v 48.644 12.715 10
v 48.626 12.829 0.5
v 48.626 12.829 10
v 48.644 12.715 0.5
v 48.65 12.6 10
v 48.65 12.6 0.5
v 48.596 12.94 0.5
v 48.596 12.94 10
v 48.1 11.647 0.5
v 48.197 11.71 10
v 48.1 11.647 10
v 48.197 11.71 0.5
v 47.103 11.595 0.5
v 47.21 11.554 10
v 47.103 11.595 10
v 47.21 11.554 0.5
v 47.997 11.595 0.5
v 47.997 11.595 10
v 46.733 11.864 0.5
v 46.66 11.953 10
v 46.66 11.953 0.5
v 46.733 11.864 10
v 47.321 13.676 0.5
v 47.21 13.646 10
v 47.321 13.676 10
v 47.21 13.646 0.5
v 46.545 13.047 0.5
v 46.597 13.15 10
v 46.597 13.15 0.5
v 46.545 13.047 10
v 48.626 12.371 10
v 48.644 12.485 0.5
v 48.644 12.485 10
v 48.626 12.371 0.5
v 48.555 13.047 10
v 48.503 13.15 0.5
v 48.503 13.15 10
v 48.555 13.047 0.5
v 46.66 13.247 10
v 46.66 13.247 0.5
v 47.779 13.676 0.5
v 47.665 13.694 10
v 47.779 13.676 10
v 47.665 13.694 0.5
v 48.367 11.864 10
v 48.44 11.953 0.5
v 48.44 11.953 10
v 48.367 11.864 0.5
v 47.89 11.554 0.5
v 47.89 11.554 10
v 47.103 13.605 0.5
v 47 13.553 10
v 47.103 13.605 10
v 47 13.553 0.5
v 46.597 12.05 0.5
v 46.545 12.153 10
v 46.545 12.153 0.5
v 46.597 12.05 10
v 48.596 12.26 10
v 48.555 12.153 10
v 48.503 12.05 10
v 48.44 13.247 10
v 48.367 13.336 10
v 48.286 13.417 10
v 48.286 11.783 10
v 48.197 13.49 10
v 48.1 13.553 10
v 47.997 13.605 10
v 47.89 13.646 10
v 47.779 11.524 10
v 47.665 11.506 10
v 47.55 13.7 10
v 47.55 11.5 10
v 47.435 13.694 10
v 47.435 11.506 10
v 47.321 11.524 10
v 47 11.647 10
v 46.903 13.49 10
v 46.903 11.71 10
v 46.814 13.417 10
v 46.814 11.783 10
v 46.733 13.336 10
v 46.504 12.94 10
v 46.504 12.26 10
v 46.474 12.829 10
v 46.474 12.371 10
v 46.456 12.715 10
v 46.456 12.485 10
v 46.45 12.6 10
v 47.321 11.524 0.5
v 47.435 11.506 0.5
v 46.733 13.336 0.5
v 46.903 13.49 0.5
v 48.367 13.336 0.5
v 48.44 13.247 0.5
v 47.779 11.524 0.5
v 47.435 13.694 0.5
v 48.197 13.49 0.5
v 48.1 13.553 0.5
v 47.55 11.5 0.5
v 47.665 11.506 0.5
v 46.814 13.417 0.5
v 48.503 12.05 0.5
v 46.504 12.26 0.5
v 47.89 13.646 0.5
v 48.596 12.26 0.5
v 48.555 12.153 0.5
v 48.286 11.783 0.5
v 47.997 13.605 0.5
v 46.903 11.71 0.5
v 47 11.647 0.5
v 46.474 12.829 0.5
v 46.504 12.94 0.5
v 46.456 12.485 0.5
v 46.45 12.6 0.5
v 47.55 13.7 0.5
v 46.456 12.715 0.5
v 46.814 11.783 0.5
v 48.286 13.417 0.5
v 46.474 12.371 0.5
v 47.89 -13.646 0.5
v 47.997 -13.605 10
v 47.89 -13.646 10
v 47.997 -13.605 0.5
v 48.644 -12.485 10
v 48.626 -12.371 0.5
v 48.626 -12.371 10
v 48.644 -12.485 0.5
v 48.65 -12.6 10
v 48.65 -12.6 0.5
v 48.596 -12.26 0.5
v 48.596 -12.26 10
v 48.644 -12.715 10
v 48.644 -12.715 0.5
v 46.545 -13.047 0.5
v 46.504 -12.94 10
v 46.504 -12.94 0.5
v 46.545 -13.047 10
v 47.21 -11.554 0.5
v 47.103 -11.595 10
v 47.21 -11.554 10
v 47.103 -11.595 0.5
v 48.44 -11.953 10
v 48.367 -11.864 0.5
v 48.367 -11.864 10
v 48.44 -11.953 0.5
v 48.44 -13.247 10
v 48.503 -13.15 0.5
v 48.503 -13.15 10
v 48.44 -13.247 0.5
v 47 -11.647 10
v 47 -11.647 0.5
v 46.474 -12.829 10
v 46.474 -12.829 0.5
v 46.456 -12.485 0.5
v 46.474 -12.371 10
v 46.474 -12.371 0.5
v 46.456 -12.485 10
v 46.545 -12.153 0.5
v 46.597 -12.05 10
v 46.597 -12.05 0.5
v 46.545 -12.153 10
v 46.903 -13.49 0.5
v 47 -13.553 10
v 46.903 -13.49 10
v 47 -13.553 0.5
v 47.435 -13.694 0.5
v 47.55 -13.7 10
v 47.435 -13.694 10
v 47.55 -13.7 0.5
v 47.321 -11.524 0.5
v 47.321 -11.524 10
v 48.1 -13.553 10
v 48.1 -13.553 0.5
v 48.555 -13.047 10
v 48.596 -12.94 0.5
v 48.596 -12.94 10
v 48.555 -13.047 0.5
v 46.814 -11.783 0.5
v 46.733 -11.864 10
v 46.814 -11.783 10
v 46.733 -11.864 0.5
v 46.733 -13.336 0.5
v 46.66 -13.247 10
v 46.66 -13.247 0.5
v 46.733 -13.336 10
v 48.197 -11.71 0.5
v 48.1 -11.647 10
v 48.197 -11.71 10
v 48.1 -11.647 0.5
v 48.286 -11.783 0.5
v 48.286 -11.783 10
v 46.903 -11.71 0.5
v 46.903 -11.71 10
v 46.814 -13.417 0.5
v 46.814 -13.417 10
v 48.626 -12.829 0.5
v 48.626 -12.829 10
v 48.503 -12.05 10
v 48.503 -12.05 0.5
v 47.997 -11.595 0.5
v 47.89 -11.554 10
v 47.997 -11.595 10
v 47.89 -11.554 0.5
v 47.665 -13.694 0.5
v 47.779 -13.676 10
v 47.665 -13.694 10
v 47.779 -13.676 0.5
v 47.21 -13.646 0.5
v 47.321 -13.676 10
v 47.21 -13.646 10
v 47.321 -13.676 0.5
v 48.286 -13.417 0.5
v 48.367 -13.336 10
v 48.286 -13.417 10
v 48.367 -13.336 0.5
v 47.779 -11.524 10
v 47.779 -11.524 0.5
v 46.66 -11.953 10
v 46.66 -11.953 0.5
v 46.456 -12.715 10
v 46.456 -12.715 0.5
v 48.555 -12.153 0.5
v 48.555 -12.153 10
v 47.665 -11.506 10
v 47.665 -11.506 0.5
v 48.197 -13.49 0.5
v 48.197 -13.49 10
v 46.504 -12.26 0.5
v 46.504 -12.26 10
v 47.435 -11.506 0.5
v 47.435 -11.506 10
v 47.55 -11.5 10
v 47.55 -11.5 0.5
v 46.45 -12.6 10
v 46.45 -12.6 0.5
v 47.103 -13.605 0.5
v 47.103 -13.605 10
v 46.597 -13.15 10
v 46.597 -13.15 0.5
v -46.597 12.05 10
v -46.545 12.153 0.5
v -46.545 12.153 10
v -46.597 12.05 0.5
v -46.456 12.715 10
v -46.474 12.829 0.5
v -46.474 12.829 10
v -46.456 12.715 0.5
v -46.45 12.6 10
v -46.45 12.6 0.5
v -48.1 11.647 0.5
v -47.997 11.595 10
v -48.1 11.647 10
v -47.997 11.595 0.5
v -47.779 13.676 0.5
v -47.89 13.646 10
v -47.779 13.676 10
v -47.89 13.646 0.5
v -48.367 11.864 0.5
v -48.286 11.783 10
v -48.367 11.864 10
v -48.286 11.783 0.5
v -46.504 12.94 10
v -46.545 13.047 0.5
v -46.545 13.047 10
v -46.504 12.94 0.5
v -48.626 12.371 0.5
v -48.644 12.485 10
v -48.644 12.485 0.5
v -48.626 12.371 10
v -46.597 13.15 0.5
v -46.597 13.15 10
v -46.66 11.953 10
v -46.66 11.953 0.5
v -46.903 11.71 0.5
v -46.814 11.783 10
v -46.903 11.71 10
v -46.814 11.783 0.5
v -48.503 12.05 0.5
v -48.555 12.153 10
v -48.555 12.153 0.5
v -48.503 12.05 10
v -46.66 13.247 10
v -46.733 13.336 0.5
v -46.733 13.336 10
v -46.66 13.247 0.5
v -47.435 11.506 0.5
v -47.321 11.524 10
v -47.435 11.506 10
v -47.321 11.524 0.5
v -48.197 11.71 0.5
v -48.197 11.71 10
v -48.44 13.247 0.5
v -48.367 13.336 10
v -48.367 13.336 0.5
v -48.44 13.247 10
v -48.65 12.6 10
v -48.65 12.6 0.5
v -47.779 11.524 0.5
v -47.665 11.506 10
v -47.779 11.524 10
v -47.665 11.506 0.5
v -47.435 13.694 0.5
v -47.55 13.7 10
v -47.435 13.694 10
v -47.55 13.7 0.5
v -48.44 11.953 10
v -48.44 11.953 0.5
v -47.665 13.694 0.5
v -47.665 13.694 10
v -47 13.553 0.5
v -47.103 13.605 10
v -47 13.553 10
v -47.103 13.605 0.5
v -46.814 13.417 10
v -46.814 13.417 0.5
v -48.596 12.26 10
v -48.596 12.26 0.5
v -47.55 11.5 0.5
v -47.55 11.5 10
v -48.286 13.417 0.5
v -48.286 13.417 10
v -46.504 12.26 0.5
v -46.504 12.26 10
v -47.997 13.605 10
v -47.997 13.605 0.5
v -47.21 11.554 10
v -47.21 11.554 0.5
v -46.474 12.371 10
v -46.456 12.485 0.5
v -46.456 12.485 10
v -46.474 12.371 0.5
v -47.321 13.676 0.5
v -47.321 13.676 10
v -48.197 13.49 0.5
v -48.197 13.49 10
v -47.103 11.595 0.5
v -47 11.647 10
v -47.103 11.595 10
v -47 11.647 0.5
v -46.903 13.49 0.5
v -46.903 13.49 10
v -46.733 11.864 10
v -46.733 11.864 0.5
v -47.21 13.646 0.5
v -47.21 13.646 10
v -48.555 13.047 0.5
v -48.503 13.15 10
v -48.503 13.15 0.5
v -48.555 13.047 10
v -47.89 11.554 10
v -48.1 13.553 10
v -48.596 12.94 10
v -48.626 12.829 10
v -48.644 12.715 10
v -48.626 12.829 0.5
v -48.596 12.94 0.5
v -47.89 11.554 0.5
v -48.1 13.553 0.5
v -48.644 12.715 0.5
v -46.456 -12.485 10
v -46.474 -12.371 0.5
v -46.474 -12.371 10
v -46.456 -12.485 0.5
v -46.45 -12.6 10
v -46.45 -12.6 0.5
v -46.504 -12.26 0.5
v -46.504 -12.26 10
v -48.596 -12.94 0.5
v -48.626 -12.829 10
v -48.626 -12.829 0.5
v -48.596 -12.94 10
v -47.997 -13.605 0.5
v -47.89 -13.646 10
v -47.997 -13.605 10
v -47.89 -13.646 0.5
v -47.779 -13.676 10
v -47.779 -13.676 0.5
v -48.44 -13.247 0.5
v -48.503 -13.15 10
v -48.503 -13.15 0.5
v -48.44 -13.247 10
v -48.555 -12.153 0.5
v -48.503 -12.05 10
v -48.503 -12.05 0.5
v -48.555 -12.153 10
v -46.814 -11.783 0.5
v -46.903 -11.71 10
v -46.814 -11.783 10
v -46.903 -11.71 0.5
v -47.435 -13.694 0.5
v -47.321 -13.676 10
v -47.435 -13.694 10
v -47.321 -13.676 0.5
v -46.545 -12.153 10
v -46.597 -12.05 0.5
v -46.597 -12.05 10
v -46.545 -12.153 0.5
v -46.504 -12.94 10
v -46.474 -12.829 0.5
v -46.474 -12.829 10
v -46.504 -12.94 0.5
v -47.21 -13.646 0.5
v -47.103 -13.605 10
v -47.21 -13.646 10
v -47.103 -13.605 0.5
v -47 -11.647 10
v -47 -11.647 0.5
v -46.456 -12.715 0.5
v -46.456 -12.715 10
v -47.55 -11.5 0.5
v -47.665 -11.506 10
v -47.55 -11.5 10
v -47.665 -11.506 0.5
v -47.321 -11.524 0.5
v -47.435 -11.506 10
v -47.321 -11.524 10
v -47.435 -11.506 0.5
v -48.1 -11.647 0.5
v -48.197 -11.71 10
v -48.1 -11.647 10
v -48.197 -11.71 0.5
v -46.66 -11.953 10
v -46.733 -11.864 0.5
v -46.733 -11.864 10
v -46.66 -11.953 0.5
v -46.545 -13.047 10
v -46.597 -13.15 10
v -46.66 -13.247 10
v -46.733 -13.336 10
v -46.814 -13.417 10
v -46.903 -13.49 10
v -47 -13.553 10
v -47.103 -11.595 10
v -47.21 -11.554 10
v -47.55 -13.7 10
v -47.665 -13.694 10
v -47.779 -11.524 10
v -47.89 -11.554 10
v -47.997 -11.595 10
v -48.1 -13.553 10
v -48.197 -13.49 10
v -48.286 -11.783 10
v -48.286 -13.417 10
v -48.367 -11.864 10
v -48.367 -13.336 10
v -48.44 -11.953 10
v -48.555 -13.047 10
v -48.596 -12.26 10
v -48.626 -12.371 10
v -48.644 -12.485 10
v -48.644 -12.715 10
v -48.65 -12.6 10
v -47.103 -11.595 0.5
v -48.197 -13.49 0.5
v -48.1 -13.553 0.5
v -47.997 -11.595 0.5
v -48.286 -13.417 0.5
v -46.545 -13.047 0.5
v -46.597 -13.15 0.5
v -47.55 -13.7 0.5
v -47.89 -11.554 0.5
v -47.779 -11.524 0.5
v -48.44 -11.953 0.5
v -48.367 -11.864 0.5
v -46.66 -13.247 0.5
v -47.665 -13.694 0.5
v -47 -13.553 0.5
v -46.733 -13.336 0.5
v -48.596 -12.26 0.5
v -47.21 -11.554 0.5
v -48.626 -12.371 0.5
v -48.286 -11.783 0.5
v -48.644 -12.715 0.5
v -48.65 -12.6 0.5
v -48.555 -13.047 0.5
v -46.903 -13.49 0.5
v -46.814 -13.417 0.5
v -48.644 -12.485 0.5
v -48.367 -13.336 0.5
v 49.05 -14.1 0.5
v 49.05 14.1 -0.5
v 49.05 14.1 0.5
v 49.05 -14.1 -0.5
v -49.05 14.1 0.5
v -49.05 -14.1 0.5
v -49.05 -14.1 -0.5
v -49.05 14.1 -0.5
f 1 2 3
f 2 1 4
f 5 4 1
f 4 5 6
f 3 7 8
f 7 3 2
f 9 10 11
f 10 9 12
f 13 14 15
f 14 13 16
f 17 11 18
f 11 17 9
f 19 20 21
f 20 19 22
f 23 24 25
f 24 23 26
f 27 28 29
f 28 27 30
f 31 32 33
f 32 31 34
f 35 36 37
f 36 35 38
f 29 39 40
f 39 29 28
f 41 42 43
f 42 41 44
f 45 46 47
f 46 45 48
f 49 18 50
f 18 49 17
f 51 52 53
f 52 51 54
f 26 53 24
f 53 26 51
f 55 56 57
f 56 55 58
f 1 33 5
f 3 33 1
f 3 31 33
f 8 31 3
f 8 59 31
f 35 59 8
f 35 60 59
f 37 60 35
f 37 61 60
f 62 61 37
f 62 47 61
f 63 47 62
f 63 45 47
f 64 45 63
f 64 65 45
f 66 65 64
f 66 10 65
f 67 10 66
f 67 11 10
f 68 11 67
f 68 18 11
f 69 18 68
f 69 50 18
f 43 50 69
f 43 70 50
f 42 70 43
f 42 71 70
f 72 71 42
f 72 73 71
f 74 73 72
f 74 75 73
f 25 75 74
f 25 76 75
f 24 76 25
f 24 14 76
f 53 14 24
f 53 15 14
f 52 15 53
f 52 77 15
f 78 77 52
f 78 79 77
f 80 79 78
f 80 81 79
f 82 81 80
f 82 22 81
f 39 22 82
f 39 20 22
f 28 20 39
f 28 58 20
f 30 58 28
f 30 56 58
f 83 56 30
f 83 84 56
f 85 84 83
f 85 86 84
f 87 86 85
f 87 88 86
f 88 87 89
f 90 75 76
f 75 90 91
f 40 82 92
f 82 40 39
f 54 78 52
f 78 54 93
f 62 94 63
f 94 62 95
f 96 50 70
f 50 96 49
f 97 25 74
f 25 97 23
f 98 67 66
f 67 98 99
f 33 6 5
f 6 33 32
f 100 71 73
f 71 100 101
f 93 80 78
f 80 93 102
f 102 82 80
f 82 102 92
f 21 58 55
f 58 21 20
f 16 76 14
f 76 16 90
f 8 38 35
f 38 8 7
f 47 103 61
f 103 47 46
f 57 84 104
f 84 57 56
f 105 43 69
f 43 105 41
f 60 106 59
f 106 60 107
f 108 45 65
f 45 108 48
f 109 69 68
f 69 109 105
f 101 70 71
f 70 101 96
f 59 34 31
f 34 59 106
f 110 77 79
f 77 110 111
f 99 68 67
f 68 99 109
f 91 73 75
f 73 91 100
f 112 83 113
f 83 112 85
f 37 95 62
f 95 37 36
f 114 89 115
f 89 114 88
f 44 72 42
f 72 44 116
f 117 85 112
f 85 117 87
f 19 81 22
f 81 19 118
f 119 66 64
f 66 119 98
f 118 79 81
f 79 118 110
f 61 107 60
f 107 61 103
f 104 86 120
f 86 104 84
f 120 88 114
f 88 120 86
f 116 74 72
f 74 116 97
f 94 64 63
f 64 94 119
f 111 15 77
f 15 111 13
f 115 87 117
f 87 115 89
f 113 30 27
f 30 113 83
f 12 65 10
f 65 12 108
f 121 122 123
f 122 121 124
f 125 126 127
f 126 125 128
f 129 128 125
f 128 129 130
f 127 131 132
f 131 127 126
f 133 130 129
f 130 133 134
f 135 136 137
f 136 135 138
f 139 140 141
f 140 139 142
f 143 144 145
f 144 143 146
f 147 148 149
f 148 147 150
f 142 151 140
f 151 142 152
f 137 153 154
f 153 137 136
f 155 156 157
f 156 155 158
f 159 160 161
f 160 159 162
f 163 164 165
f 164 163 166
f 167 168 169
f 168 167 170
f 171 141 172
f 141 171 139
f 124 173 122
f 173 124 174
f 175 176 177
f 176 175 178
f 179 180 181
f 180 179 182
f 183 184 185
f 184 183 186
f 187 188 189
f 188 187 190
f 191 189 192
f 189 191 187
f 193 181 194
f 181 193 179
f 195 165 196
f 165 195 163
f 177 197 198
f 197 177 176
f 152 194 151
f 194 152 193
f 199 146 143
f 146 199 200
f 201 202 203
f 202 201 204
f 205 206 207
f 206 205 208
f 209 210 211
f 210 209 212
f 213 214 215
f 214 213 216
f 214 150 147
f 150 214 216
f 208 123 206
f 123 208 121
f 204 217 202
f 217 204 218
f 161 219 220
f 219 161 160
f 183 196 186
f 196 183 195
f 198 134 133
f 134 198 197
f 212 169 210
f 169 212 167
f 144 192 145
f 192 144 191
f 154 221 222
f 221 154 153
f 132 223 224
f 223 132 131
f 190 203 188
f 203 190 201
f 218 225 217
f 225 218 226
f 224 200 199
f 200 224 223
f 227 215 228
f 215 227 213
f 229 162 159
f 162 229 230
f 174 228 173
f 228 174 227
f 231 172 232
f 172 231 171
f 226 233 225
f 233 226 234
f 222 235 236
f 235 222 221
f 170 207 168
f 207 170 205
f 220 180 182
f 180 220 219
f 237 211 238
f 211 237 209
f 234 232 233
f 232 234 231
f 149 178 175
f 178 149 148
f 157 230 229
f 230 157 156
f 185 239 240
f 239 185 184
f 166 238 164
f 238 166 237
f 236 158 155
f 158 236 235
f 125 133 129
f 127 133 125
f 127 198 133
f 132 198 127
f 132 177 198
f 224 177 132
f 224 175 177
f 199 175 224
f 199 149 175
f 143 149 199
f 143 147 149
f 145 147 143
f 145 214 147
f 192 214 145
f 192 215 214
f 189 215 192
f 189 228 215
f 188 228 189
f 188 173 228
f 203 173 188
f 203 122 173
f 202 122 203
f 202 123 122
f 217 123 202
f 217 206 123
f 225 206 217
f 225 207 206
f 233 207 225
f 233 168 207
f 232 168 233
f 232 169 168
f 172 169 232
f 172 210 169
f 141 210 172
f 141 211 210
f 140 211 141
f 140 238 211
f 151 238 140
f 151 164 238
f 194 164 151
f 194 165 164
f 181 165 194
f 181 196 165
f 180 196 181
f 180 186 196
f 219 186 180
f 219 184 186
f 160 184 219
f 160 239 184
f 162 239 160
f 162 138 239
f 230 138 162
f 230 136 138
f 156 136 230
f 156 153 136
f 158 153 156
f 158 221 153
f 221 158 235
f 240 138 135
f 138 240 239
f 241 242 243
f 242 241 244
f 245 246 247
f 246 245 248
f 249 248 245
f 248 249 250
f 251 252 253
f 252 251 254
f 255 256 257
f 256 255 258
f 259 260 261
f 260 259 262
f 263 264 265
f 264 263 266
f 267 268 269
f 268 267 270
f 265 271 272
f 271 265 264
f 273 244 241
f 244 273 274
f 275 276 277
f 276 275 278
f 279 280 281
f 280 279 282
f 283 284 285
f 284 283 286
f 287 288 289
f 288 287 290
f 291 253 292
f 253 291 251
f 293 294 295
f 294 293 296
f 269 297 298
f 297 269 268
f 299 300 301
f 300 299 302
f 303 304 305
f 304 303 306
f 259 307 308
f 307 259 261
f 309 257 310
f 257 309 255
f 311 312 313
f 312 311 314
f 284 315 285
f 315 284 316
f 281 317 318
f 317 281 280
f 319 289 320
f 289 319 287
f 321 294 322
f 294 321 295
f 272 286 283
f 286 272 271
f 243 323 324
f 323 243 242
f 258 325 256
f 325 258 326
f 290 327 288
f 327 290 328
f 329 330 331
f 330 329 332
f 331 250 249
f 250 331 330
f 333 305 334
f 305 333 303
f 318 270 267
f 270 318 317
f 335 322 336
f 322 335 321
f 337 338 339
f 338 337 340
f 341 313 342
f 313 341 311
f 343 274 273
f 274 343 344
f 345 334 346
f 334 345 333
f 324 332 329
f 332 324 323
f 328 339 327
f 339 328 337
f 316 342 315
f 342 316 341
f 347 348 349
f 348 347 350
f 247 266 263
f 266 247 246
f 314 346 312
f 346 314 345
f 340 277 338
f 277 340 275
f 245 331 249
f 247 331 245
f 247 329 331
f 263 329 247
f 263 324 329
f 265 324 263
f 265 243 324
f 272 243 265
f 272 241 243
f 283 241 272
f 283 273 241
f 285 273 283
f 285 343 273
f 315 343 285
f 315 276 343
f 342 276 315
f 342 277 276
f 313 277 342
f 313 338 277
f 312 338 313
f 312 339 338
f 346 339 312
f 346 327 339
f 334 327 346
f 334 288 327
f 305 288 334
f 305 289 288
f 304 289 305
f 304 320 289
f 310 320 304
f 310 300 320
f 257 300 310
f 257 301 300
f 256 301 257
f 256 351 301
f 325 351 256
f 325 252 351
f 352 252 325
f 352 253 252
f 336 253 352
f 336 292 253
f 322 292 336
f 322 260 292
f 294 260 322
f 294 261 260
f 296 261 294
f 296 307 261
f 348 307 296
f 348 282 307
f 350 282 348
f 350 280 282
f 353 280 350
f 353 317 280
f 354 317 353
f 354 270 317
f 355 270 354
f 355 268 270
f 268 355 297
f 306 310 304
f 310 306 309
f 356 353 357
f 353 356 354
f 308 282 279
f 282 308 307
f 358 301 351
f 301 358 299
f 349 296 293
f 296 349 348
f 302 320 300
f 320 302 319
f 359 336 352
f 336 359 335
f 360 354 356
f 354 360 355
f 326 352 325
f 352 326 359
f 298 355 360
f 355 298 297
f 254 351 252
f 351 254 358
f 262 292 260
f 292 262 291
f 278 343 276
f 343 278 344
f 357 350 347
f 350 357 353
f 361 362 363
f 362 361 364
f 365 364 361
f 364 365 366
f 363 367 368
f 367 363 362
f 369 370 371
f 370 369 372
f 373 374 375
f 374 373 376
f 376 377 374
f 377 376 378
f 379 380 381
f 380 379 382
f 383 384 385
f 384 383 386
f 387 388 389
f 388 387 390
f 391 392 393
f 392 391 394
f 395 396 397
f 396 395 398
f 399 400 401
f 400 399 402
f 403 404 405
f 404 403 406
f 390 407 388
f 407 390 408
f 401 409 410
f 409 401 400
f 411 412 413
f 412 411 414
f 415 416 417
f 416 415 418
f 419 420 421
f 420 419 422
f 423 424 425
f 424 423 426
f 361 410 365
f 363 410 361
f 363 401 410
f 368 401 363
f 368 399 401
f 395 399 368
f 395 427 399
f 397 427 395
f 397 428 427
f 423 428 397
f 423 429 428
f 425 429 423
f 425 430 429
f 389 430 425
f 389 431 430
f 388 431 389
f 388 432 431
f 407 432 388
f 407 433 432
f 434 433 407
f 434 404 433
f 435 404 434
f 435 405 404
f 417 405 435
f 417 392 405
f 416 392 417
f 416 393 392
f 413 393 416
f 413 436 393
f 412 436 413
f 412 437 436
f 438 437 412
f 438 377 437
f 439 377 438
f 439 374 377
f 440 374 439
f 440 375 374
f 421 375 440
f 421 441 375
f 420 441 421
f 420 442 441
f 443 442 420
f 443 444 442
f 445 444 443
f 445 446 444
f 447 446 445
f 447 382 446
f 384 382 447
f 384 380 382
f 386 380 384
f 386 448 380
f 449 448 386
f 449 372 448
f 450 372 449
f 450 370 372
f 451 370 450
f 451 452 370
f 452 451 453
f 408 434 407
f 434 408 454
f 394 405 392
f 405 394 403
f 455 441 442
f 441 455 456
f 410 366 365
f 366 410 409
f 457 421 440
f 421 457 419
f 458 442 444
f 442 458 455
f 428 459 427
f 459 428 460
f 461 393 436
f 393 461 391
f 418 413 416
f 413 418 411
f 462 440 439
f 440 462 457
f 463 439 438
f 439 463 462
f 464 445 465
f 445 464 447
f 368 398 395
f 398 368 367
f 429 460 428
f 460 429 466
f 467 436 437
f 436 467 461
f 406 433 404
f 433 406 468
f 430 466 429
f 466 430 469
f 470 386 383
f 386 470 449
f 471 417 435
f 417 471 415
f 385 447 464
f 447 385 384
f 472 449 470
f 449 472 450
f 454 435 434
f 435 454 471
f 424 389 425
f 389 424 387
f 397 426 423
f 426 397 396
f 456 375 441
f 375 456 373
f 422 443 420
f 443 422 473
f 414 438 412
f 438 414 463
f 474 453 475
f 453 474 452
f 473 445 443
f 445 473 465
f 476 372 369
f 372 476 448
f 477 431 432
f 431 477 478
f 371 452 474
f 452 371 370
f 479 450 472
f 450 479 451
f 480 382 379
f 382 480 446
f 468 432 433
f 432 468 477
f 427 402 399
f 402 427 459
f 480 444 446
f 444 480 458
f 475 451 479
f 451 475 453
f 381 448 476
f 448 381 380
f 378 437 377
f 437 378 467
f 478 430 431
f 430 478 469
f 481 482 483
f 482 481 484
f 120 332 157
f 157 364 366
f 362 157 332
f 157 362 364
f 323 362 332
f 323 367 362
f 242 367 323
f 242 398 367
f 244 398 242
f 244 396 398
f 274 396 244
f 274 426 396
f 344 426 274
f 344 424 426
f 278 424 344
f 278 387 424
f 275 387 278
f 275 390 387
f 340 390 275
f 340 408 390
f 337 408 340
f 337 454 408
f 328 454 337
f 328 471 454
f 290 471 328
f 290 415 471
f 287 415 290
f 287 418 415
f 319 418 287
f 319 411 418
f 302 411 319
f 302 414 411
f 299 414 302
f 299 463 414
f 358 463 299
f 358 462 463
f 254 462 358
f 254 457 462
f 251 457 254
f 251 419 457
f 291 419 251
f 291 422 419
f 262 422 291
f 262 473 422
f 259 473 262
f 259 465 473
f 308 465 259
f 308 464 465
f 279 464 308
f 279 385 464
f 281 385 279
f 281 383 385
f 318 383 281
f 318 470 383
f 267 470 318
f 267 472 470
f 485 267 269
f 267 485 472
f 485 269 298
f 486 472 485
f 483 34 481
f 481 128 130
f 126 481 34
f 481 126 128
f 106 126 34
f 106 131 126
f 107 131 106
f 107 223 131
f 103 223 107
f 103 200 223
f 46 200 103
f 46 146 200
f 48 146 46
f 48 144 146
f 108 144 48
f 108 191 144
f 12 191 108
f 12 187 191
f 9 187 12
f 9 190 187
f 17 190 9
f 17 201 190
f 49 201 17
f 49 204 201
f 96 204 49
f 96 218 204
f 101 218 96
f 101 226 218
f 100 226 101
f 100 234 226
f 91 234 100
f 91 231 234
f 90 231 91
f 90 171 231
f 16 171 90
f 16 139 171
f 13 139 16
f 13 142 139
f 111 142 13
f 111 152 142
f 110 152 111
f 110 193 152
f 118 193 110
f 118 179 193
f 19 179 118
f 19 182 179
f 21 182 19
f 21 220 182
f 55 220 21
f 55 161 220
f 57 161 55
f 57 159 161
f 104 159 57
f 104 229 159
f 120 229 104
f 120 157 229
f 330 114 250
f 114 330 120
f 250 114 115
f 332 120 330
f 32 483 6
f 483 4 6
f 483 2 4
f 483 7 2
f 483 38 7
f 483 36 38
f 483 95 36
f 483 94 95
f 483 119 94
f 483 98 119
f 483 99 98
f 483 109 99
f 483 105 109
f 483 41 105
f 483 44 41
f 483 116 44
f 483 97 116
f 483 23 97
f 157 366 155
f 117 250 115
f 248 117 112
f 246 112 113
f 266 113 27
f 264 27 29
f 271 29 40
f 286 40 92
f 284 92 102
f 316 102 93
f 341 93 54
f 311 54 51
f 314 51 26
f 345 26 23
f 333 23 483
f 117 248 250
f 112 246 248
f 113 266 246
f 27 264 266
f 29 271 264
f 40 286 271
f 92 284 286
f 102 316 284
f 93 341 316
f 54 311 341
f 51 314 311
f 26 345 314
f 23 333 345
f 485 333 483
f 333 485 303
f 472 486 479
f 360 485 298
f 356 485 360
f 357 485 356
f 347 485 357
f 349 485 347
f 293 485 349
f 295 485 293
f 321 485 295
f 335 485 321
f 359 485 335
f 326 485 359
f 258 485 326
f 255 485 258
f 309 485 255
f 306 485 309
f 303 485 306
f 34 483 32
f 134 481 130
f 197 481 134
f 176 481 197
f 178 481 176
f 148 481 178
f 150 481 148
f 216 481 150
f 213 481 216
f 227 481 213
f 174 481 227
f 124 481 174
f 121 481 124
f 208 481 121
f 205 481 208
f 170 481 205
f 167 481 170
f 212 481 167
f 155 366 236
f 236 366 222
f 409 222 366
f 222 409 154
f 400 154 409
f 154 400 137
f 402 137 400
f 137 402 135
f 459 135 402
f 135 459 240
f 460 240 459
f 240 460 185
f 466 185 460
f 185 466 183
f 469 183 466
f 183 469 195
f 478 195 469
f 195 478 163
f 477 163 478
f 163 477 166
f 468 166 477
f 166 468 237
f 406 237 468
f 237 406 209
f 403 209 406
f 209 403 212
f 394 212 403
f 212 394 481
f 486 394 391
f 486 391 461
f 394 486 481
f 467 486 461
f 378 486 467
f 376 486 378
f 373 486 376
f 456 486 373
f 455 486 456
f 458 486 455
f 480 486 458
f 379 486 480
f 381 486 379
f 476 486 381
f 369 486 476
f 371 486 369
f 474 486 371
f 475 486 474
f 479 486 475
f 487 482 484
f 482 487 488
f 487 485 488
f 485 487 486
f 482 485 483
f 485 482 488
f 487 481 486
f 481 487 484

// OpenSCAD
pin_h = 10;
pin_d = 7;
hole_d = 2.8;
//pin_d = hole_d-0.4;
holes_dx = 91.7+hole_d/2;
holes_dy = 21.8+hole_d/2;

m2_insert_d1 = 2.8; // FYI
m2_insert_d2 = 3.4; // FYI
m2_d = 3.1;         // to be used
m2_h = 3.9+0.5;     // depth of hole for insert


// pins shifting
x_shift = holes_dx/2+1;
y_shift = holes_dy/2+1;
//h_shift = box_h/2-pin_h/2;
switch_x_dist = x_shift-10;
switch_y_dist = -25;
switch_h_dist = -5;

delta=3;
plate_x = 2 * x_shift + delta;
plate_y = 2 * y_shift + delta;
plate_h = 1;
   
bat18650_holder( _negative=0);
//bat18650_holder( _negative=1);
    
module bat18650_holder(_negative=0) {
    // if _negative is 0: create the holder
    // if _negative is 1: create the negative for holes
    //      fpr the switch & charging
    if (_negative==0) {
        translate([0,0,pin_h/2]) 18650_pins(_pin=1);
        cube([plate_x,plate_y,plate_h],center=true);        
    } // of if()
    else {
        x = 8;
        y = 10;
        d = 16 ;
        translate([switch_x_dist,-holes_dy/2-5,y/2+plate_h+0.5])
            cube([x,d,y],center=true);
       translate([-switch_x_dist,-holes_dy/2-5,y/2+plate_h+0.5])
            cube([x,d,y],center=true);
    } // of else()
} // of ()


module 18650_pins(_pin=1) {
    // _pin = 1:  holes for inserts
    // _pin = 0:  pins only
    
    translate([ x_shift, y_shift,0])
        holding_pin(_d=pin_d,_h=pin_h,_pin_only=_pin);
    translate([ x_shift,-y_shift,0])
        holding_pin(_d=pin_d,_h=pin_h,_pin_only=_pin);
    translate([-x_shift, y_shift,0])
        holding_pin(_d=pin_d,_h=pin_h,_pin_only=_pin);
    translate([-x_shift,-y_shift,0])
         holding_pin(_d=pin_d,_h=pin_h,_pin_only=_pin);
} // of 18650_pins()



module holding_pin(_d,_h,_pin_only=0) {
    // pins_only = 0 have holes for inserts
    // pins_only = 1 have malepins to hold the pcb
    if (_pin_only == 0) {
        // for inserts screws
        difference(){
            //color("red") cylinder(d=_d,h=_h,$fn=60,center=true);
            color("cyan") cube([_d,_d,_h],center=true);
            //cylinder(d=_d,h=_h,$fn=60,center=true);
            translate ([0,0,_h-m2_h])
            cylinder(d=m2_d,h=_h,$fn=60,center=true);
        } // of difference()
    } // of if()
    else {
        // just a pin
        cylinder(d=2.2,h=_h,$fn=60,center=true);
    } // of else 
} // of holding_pin()
